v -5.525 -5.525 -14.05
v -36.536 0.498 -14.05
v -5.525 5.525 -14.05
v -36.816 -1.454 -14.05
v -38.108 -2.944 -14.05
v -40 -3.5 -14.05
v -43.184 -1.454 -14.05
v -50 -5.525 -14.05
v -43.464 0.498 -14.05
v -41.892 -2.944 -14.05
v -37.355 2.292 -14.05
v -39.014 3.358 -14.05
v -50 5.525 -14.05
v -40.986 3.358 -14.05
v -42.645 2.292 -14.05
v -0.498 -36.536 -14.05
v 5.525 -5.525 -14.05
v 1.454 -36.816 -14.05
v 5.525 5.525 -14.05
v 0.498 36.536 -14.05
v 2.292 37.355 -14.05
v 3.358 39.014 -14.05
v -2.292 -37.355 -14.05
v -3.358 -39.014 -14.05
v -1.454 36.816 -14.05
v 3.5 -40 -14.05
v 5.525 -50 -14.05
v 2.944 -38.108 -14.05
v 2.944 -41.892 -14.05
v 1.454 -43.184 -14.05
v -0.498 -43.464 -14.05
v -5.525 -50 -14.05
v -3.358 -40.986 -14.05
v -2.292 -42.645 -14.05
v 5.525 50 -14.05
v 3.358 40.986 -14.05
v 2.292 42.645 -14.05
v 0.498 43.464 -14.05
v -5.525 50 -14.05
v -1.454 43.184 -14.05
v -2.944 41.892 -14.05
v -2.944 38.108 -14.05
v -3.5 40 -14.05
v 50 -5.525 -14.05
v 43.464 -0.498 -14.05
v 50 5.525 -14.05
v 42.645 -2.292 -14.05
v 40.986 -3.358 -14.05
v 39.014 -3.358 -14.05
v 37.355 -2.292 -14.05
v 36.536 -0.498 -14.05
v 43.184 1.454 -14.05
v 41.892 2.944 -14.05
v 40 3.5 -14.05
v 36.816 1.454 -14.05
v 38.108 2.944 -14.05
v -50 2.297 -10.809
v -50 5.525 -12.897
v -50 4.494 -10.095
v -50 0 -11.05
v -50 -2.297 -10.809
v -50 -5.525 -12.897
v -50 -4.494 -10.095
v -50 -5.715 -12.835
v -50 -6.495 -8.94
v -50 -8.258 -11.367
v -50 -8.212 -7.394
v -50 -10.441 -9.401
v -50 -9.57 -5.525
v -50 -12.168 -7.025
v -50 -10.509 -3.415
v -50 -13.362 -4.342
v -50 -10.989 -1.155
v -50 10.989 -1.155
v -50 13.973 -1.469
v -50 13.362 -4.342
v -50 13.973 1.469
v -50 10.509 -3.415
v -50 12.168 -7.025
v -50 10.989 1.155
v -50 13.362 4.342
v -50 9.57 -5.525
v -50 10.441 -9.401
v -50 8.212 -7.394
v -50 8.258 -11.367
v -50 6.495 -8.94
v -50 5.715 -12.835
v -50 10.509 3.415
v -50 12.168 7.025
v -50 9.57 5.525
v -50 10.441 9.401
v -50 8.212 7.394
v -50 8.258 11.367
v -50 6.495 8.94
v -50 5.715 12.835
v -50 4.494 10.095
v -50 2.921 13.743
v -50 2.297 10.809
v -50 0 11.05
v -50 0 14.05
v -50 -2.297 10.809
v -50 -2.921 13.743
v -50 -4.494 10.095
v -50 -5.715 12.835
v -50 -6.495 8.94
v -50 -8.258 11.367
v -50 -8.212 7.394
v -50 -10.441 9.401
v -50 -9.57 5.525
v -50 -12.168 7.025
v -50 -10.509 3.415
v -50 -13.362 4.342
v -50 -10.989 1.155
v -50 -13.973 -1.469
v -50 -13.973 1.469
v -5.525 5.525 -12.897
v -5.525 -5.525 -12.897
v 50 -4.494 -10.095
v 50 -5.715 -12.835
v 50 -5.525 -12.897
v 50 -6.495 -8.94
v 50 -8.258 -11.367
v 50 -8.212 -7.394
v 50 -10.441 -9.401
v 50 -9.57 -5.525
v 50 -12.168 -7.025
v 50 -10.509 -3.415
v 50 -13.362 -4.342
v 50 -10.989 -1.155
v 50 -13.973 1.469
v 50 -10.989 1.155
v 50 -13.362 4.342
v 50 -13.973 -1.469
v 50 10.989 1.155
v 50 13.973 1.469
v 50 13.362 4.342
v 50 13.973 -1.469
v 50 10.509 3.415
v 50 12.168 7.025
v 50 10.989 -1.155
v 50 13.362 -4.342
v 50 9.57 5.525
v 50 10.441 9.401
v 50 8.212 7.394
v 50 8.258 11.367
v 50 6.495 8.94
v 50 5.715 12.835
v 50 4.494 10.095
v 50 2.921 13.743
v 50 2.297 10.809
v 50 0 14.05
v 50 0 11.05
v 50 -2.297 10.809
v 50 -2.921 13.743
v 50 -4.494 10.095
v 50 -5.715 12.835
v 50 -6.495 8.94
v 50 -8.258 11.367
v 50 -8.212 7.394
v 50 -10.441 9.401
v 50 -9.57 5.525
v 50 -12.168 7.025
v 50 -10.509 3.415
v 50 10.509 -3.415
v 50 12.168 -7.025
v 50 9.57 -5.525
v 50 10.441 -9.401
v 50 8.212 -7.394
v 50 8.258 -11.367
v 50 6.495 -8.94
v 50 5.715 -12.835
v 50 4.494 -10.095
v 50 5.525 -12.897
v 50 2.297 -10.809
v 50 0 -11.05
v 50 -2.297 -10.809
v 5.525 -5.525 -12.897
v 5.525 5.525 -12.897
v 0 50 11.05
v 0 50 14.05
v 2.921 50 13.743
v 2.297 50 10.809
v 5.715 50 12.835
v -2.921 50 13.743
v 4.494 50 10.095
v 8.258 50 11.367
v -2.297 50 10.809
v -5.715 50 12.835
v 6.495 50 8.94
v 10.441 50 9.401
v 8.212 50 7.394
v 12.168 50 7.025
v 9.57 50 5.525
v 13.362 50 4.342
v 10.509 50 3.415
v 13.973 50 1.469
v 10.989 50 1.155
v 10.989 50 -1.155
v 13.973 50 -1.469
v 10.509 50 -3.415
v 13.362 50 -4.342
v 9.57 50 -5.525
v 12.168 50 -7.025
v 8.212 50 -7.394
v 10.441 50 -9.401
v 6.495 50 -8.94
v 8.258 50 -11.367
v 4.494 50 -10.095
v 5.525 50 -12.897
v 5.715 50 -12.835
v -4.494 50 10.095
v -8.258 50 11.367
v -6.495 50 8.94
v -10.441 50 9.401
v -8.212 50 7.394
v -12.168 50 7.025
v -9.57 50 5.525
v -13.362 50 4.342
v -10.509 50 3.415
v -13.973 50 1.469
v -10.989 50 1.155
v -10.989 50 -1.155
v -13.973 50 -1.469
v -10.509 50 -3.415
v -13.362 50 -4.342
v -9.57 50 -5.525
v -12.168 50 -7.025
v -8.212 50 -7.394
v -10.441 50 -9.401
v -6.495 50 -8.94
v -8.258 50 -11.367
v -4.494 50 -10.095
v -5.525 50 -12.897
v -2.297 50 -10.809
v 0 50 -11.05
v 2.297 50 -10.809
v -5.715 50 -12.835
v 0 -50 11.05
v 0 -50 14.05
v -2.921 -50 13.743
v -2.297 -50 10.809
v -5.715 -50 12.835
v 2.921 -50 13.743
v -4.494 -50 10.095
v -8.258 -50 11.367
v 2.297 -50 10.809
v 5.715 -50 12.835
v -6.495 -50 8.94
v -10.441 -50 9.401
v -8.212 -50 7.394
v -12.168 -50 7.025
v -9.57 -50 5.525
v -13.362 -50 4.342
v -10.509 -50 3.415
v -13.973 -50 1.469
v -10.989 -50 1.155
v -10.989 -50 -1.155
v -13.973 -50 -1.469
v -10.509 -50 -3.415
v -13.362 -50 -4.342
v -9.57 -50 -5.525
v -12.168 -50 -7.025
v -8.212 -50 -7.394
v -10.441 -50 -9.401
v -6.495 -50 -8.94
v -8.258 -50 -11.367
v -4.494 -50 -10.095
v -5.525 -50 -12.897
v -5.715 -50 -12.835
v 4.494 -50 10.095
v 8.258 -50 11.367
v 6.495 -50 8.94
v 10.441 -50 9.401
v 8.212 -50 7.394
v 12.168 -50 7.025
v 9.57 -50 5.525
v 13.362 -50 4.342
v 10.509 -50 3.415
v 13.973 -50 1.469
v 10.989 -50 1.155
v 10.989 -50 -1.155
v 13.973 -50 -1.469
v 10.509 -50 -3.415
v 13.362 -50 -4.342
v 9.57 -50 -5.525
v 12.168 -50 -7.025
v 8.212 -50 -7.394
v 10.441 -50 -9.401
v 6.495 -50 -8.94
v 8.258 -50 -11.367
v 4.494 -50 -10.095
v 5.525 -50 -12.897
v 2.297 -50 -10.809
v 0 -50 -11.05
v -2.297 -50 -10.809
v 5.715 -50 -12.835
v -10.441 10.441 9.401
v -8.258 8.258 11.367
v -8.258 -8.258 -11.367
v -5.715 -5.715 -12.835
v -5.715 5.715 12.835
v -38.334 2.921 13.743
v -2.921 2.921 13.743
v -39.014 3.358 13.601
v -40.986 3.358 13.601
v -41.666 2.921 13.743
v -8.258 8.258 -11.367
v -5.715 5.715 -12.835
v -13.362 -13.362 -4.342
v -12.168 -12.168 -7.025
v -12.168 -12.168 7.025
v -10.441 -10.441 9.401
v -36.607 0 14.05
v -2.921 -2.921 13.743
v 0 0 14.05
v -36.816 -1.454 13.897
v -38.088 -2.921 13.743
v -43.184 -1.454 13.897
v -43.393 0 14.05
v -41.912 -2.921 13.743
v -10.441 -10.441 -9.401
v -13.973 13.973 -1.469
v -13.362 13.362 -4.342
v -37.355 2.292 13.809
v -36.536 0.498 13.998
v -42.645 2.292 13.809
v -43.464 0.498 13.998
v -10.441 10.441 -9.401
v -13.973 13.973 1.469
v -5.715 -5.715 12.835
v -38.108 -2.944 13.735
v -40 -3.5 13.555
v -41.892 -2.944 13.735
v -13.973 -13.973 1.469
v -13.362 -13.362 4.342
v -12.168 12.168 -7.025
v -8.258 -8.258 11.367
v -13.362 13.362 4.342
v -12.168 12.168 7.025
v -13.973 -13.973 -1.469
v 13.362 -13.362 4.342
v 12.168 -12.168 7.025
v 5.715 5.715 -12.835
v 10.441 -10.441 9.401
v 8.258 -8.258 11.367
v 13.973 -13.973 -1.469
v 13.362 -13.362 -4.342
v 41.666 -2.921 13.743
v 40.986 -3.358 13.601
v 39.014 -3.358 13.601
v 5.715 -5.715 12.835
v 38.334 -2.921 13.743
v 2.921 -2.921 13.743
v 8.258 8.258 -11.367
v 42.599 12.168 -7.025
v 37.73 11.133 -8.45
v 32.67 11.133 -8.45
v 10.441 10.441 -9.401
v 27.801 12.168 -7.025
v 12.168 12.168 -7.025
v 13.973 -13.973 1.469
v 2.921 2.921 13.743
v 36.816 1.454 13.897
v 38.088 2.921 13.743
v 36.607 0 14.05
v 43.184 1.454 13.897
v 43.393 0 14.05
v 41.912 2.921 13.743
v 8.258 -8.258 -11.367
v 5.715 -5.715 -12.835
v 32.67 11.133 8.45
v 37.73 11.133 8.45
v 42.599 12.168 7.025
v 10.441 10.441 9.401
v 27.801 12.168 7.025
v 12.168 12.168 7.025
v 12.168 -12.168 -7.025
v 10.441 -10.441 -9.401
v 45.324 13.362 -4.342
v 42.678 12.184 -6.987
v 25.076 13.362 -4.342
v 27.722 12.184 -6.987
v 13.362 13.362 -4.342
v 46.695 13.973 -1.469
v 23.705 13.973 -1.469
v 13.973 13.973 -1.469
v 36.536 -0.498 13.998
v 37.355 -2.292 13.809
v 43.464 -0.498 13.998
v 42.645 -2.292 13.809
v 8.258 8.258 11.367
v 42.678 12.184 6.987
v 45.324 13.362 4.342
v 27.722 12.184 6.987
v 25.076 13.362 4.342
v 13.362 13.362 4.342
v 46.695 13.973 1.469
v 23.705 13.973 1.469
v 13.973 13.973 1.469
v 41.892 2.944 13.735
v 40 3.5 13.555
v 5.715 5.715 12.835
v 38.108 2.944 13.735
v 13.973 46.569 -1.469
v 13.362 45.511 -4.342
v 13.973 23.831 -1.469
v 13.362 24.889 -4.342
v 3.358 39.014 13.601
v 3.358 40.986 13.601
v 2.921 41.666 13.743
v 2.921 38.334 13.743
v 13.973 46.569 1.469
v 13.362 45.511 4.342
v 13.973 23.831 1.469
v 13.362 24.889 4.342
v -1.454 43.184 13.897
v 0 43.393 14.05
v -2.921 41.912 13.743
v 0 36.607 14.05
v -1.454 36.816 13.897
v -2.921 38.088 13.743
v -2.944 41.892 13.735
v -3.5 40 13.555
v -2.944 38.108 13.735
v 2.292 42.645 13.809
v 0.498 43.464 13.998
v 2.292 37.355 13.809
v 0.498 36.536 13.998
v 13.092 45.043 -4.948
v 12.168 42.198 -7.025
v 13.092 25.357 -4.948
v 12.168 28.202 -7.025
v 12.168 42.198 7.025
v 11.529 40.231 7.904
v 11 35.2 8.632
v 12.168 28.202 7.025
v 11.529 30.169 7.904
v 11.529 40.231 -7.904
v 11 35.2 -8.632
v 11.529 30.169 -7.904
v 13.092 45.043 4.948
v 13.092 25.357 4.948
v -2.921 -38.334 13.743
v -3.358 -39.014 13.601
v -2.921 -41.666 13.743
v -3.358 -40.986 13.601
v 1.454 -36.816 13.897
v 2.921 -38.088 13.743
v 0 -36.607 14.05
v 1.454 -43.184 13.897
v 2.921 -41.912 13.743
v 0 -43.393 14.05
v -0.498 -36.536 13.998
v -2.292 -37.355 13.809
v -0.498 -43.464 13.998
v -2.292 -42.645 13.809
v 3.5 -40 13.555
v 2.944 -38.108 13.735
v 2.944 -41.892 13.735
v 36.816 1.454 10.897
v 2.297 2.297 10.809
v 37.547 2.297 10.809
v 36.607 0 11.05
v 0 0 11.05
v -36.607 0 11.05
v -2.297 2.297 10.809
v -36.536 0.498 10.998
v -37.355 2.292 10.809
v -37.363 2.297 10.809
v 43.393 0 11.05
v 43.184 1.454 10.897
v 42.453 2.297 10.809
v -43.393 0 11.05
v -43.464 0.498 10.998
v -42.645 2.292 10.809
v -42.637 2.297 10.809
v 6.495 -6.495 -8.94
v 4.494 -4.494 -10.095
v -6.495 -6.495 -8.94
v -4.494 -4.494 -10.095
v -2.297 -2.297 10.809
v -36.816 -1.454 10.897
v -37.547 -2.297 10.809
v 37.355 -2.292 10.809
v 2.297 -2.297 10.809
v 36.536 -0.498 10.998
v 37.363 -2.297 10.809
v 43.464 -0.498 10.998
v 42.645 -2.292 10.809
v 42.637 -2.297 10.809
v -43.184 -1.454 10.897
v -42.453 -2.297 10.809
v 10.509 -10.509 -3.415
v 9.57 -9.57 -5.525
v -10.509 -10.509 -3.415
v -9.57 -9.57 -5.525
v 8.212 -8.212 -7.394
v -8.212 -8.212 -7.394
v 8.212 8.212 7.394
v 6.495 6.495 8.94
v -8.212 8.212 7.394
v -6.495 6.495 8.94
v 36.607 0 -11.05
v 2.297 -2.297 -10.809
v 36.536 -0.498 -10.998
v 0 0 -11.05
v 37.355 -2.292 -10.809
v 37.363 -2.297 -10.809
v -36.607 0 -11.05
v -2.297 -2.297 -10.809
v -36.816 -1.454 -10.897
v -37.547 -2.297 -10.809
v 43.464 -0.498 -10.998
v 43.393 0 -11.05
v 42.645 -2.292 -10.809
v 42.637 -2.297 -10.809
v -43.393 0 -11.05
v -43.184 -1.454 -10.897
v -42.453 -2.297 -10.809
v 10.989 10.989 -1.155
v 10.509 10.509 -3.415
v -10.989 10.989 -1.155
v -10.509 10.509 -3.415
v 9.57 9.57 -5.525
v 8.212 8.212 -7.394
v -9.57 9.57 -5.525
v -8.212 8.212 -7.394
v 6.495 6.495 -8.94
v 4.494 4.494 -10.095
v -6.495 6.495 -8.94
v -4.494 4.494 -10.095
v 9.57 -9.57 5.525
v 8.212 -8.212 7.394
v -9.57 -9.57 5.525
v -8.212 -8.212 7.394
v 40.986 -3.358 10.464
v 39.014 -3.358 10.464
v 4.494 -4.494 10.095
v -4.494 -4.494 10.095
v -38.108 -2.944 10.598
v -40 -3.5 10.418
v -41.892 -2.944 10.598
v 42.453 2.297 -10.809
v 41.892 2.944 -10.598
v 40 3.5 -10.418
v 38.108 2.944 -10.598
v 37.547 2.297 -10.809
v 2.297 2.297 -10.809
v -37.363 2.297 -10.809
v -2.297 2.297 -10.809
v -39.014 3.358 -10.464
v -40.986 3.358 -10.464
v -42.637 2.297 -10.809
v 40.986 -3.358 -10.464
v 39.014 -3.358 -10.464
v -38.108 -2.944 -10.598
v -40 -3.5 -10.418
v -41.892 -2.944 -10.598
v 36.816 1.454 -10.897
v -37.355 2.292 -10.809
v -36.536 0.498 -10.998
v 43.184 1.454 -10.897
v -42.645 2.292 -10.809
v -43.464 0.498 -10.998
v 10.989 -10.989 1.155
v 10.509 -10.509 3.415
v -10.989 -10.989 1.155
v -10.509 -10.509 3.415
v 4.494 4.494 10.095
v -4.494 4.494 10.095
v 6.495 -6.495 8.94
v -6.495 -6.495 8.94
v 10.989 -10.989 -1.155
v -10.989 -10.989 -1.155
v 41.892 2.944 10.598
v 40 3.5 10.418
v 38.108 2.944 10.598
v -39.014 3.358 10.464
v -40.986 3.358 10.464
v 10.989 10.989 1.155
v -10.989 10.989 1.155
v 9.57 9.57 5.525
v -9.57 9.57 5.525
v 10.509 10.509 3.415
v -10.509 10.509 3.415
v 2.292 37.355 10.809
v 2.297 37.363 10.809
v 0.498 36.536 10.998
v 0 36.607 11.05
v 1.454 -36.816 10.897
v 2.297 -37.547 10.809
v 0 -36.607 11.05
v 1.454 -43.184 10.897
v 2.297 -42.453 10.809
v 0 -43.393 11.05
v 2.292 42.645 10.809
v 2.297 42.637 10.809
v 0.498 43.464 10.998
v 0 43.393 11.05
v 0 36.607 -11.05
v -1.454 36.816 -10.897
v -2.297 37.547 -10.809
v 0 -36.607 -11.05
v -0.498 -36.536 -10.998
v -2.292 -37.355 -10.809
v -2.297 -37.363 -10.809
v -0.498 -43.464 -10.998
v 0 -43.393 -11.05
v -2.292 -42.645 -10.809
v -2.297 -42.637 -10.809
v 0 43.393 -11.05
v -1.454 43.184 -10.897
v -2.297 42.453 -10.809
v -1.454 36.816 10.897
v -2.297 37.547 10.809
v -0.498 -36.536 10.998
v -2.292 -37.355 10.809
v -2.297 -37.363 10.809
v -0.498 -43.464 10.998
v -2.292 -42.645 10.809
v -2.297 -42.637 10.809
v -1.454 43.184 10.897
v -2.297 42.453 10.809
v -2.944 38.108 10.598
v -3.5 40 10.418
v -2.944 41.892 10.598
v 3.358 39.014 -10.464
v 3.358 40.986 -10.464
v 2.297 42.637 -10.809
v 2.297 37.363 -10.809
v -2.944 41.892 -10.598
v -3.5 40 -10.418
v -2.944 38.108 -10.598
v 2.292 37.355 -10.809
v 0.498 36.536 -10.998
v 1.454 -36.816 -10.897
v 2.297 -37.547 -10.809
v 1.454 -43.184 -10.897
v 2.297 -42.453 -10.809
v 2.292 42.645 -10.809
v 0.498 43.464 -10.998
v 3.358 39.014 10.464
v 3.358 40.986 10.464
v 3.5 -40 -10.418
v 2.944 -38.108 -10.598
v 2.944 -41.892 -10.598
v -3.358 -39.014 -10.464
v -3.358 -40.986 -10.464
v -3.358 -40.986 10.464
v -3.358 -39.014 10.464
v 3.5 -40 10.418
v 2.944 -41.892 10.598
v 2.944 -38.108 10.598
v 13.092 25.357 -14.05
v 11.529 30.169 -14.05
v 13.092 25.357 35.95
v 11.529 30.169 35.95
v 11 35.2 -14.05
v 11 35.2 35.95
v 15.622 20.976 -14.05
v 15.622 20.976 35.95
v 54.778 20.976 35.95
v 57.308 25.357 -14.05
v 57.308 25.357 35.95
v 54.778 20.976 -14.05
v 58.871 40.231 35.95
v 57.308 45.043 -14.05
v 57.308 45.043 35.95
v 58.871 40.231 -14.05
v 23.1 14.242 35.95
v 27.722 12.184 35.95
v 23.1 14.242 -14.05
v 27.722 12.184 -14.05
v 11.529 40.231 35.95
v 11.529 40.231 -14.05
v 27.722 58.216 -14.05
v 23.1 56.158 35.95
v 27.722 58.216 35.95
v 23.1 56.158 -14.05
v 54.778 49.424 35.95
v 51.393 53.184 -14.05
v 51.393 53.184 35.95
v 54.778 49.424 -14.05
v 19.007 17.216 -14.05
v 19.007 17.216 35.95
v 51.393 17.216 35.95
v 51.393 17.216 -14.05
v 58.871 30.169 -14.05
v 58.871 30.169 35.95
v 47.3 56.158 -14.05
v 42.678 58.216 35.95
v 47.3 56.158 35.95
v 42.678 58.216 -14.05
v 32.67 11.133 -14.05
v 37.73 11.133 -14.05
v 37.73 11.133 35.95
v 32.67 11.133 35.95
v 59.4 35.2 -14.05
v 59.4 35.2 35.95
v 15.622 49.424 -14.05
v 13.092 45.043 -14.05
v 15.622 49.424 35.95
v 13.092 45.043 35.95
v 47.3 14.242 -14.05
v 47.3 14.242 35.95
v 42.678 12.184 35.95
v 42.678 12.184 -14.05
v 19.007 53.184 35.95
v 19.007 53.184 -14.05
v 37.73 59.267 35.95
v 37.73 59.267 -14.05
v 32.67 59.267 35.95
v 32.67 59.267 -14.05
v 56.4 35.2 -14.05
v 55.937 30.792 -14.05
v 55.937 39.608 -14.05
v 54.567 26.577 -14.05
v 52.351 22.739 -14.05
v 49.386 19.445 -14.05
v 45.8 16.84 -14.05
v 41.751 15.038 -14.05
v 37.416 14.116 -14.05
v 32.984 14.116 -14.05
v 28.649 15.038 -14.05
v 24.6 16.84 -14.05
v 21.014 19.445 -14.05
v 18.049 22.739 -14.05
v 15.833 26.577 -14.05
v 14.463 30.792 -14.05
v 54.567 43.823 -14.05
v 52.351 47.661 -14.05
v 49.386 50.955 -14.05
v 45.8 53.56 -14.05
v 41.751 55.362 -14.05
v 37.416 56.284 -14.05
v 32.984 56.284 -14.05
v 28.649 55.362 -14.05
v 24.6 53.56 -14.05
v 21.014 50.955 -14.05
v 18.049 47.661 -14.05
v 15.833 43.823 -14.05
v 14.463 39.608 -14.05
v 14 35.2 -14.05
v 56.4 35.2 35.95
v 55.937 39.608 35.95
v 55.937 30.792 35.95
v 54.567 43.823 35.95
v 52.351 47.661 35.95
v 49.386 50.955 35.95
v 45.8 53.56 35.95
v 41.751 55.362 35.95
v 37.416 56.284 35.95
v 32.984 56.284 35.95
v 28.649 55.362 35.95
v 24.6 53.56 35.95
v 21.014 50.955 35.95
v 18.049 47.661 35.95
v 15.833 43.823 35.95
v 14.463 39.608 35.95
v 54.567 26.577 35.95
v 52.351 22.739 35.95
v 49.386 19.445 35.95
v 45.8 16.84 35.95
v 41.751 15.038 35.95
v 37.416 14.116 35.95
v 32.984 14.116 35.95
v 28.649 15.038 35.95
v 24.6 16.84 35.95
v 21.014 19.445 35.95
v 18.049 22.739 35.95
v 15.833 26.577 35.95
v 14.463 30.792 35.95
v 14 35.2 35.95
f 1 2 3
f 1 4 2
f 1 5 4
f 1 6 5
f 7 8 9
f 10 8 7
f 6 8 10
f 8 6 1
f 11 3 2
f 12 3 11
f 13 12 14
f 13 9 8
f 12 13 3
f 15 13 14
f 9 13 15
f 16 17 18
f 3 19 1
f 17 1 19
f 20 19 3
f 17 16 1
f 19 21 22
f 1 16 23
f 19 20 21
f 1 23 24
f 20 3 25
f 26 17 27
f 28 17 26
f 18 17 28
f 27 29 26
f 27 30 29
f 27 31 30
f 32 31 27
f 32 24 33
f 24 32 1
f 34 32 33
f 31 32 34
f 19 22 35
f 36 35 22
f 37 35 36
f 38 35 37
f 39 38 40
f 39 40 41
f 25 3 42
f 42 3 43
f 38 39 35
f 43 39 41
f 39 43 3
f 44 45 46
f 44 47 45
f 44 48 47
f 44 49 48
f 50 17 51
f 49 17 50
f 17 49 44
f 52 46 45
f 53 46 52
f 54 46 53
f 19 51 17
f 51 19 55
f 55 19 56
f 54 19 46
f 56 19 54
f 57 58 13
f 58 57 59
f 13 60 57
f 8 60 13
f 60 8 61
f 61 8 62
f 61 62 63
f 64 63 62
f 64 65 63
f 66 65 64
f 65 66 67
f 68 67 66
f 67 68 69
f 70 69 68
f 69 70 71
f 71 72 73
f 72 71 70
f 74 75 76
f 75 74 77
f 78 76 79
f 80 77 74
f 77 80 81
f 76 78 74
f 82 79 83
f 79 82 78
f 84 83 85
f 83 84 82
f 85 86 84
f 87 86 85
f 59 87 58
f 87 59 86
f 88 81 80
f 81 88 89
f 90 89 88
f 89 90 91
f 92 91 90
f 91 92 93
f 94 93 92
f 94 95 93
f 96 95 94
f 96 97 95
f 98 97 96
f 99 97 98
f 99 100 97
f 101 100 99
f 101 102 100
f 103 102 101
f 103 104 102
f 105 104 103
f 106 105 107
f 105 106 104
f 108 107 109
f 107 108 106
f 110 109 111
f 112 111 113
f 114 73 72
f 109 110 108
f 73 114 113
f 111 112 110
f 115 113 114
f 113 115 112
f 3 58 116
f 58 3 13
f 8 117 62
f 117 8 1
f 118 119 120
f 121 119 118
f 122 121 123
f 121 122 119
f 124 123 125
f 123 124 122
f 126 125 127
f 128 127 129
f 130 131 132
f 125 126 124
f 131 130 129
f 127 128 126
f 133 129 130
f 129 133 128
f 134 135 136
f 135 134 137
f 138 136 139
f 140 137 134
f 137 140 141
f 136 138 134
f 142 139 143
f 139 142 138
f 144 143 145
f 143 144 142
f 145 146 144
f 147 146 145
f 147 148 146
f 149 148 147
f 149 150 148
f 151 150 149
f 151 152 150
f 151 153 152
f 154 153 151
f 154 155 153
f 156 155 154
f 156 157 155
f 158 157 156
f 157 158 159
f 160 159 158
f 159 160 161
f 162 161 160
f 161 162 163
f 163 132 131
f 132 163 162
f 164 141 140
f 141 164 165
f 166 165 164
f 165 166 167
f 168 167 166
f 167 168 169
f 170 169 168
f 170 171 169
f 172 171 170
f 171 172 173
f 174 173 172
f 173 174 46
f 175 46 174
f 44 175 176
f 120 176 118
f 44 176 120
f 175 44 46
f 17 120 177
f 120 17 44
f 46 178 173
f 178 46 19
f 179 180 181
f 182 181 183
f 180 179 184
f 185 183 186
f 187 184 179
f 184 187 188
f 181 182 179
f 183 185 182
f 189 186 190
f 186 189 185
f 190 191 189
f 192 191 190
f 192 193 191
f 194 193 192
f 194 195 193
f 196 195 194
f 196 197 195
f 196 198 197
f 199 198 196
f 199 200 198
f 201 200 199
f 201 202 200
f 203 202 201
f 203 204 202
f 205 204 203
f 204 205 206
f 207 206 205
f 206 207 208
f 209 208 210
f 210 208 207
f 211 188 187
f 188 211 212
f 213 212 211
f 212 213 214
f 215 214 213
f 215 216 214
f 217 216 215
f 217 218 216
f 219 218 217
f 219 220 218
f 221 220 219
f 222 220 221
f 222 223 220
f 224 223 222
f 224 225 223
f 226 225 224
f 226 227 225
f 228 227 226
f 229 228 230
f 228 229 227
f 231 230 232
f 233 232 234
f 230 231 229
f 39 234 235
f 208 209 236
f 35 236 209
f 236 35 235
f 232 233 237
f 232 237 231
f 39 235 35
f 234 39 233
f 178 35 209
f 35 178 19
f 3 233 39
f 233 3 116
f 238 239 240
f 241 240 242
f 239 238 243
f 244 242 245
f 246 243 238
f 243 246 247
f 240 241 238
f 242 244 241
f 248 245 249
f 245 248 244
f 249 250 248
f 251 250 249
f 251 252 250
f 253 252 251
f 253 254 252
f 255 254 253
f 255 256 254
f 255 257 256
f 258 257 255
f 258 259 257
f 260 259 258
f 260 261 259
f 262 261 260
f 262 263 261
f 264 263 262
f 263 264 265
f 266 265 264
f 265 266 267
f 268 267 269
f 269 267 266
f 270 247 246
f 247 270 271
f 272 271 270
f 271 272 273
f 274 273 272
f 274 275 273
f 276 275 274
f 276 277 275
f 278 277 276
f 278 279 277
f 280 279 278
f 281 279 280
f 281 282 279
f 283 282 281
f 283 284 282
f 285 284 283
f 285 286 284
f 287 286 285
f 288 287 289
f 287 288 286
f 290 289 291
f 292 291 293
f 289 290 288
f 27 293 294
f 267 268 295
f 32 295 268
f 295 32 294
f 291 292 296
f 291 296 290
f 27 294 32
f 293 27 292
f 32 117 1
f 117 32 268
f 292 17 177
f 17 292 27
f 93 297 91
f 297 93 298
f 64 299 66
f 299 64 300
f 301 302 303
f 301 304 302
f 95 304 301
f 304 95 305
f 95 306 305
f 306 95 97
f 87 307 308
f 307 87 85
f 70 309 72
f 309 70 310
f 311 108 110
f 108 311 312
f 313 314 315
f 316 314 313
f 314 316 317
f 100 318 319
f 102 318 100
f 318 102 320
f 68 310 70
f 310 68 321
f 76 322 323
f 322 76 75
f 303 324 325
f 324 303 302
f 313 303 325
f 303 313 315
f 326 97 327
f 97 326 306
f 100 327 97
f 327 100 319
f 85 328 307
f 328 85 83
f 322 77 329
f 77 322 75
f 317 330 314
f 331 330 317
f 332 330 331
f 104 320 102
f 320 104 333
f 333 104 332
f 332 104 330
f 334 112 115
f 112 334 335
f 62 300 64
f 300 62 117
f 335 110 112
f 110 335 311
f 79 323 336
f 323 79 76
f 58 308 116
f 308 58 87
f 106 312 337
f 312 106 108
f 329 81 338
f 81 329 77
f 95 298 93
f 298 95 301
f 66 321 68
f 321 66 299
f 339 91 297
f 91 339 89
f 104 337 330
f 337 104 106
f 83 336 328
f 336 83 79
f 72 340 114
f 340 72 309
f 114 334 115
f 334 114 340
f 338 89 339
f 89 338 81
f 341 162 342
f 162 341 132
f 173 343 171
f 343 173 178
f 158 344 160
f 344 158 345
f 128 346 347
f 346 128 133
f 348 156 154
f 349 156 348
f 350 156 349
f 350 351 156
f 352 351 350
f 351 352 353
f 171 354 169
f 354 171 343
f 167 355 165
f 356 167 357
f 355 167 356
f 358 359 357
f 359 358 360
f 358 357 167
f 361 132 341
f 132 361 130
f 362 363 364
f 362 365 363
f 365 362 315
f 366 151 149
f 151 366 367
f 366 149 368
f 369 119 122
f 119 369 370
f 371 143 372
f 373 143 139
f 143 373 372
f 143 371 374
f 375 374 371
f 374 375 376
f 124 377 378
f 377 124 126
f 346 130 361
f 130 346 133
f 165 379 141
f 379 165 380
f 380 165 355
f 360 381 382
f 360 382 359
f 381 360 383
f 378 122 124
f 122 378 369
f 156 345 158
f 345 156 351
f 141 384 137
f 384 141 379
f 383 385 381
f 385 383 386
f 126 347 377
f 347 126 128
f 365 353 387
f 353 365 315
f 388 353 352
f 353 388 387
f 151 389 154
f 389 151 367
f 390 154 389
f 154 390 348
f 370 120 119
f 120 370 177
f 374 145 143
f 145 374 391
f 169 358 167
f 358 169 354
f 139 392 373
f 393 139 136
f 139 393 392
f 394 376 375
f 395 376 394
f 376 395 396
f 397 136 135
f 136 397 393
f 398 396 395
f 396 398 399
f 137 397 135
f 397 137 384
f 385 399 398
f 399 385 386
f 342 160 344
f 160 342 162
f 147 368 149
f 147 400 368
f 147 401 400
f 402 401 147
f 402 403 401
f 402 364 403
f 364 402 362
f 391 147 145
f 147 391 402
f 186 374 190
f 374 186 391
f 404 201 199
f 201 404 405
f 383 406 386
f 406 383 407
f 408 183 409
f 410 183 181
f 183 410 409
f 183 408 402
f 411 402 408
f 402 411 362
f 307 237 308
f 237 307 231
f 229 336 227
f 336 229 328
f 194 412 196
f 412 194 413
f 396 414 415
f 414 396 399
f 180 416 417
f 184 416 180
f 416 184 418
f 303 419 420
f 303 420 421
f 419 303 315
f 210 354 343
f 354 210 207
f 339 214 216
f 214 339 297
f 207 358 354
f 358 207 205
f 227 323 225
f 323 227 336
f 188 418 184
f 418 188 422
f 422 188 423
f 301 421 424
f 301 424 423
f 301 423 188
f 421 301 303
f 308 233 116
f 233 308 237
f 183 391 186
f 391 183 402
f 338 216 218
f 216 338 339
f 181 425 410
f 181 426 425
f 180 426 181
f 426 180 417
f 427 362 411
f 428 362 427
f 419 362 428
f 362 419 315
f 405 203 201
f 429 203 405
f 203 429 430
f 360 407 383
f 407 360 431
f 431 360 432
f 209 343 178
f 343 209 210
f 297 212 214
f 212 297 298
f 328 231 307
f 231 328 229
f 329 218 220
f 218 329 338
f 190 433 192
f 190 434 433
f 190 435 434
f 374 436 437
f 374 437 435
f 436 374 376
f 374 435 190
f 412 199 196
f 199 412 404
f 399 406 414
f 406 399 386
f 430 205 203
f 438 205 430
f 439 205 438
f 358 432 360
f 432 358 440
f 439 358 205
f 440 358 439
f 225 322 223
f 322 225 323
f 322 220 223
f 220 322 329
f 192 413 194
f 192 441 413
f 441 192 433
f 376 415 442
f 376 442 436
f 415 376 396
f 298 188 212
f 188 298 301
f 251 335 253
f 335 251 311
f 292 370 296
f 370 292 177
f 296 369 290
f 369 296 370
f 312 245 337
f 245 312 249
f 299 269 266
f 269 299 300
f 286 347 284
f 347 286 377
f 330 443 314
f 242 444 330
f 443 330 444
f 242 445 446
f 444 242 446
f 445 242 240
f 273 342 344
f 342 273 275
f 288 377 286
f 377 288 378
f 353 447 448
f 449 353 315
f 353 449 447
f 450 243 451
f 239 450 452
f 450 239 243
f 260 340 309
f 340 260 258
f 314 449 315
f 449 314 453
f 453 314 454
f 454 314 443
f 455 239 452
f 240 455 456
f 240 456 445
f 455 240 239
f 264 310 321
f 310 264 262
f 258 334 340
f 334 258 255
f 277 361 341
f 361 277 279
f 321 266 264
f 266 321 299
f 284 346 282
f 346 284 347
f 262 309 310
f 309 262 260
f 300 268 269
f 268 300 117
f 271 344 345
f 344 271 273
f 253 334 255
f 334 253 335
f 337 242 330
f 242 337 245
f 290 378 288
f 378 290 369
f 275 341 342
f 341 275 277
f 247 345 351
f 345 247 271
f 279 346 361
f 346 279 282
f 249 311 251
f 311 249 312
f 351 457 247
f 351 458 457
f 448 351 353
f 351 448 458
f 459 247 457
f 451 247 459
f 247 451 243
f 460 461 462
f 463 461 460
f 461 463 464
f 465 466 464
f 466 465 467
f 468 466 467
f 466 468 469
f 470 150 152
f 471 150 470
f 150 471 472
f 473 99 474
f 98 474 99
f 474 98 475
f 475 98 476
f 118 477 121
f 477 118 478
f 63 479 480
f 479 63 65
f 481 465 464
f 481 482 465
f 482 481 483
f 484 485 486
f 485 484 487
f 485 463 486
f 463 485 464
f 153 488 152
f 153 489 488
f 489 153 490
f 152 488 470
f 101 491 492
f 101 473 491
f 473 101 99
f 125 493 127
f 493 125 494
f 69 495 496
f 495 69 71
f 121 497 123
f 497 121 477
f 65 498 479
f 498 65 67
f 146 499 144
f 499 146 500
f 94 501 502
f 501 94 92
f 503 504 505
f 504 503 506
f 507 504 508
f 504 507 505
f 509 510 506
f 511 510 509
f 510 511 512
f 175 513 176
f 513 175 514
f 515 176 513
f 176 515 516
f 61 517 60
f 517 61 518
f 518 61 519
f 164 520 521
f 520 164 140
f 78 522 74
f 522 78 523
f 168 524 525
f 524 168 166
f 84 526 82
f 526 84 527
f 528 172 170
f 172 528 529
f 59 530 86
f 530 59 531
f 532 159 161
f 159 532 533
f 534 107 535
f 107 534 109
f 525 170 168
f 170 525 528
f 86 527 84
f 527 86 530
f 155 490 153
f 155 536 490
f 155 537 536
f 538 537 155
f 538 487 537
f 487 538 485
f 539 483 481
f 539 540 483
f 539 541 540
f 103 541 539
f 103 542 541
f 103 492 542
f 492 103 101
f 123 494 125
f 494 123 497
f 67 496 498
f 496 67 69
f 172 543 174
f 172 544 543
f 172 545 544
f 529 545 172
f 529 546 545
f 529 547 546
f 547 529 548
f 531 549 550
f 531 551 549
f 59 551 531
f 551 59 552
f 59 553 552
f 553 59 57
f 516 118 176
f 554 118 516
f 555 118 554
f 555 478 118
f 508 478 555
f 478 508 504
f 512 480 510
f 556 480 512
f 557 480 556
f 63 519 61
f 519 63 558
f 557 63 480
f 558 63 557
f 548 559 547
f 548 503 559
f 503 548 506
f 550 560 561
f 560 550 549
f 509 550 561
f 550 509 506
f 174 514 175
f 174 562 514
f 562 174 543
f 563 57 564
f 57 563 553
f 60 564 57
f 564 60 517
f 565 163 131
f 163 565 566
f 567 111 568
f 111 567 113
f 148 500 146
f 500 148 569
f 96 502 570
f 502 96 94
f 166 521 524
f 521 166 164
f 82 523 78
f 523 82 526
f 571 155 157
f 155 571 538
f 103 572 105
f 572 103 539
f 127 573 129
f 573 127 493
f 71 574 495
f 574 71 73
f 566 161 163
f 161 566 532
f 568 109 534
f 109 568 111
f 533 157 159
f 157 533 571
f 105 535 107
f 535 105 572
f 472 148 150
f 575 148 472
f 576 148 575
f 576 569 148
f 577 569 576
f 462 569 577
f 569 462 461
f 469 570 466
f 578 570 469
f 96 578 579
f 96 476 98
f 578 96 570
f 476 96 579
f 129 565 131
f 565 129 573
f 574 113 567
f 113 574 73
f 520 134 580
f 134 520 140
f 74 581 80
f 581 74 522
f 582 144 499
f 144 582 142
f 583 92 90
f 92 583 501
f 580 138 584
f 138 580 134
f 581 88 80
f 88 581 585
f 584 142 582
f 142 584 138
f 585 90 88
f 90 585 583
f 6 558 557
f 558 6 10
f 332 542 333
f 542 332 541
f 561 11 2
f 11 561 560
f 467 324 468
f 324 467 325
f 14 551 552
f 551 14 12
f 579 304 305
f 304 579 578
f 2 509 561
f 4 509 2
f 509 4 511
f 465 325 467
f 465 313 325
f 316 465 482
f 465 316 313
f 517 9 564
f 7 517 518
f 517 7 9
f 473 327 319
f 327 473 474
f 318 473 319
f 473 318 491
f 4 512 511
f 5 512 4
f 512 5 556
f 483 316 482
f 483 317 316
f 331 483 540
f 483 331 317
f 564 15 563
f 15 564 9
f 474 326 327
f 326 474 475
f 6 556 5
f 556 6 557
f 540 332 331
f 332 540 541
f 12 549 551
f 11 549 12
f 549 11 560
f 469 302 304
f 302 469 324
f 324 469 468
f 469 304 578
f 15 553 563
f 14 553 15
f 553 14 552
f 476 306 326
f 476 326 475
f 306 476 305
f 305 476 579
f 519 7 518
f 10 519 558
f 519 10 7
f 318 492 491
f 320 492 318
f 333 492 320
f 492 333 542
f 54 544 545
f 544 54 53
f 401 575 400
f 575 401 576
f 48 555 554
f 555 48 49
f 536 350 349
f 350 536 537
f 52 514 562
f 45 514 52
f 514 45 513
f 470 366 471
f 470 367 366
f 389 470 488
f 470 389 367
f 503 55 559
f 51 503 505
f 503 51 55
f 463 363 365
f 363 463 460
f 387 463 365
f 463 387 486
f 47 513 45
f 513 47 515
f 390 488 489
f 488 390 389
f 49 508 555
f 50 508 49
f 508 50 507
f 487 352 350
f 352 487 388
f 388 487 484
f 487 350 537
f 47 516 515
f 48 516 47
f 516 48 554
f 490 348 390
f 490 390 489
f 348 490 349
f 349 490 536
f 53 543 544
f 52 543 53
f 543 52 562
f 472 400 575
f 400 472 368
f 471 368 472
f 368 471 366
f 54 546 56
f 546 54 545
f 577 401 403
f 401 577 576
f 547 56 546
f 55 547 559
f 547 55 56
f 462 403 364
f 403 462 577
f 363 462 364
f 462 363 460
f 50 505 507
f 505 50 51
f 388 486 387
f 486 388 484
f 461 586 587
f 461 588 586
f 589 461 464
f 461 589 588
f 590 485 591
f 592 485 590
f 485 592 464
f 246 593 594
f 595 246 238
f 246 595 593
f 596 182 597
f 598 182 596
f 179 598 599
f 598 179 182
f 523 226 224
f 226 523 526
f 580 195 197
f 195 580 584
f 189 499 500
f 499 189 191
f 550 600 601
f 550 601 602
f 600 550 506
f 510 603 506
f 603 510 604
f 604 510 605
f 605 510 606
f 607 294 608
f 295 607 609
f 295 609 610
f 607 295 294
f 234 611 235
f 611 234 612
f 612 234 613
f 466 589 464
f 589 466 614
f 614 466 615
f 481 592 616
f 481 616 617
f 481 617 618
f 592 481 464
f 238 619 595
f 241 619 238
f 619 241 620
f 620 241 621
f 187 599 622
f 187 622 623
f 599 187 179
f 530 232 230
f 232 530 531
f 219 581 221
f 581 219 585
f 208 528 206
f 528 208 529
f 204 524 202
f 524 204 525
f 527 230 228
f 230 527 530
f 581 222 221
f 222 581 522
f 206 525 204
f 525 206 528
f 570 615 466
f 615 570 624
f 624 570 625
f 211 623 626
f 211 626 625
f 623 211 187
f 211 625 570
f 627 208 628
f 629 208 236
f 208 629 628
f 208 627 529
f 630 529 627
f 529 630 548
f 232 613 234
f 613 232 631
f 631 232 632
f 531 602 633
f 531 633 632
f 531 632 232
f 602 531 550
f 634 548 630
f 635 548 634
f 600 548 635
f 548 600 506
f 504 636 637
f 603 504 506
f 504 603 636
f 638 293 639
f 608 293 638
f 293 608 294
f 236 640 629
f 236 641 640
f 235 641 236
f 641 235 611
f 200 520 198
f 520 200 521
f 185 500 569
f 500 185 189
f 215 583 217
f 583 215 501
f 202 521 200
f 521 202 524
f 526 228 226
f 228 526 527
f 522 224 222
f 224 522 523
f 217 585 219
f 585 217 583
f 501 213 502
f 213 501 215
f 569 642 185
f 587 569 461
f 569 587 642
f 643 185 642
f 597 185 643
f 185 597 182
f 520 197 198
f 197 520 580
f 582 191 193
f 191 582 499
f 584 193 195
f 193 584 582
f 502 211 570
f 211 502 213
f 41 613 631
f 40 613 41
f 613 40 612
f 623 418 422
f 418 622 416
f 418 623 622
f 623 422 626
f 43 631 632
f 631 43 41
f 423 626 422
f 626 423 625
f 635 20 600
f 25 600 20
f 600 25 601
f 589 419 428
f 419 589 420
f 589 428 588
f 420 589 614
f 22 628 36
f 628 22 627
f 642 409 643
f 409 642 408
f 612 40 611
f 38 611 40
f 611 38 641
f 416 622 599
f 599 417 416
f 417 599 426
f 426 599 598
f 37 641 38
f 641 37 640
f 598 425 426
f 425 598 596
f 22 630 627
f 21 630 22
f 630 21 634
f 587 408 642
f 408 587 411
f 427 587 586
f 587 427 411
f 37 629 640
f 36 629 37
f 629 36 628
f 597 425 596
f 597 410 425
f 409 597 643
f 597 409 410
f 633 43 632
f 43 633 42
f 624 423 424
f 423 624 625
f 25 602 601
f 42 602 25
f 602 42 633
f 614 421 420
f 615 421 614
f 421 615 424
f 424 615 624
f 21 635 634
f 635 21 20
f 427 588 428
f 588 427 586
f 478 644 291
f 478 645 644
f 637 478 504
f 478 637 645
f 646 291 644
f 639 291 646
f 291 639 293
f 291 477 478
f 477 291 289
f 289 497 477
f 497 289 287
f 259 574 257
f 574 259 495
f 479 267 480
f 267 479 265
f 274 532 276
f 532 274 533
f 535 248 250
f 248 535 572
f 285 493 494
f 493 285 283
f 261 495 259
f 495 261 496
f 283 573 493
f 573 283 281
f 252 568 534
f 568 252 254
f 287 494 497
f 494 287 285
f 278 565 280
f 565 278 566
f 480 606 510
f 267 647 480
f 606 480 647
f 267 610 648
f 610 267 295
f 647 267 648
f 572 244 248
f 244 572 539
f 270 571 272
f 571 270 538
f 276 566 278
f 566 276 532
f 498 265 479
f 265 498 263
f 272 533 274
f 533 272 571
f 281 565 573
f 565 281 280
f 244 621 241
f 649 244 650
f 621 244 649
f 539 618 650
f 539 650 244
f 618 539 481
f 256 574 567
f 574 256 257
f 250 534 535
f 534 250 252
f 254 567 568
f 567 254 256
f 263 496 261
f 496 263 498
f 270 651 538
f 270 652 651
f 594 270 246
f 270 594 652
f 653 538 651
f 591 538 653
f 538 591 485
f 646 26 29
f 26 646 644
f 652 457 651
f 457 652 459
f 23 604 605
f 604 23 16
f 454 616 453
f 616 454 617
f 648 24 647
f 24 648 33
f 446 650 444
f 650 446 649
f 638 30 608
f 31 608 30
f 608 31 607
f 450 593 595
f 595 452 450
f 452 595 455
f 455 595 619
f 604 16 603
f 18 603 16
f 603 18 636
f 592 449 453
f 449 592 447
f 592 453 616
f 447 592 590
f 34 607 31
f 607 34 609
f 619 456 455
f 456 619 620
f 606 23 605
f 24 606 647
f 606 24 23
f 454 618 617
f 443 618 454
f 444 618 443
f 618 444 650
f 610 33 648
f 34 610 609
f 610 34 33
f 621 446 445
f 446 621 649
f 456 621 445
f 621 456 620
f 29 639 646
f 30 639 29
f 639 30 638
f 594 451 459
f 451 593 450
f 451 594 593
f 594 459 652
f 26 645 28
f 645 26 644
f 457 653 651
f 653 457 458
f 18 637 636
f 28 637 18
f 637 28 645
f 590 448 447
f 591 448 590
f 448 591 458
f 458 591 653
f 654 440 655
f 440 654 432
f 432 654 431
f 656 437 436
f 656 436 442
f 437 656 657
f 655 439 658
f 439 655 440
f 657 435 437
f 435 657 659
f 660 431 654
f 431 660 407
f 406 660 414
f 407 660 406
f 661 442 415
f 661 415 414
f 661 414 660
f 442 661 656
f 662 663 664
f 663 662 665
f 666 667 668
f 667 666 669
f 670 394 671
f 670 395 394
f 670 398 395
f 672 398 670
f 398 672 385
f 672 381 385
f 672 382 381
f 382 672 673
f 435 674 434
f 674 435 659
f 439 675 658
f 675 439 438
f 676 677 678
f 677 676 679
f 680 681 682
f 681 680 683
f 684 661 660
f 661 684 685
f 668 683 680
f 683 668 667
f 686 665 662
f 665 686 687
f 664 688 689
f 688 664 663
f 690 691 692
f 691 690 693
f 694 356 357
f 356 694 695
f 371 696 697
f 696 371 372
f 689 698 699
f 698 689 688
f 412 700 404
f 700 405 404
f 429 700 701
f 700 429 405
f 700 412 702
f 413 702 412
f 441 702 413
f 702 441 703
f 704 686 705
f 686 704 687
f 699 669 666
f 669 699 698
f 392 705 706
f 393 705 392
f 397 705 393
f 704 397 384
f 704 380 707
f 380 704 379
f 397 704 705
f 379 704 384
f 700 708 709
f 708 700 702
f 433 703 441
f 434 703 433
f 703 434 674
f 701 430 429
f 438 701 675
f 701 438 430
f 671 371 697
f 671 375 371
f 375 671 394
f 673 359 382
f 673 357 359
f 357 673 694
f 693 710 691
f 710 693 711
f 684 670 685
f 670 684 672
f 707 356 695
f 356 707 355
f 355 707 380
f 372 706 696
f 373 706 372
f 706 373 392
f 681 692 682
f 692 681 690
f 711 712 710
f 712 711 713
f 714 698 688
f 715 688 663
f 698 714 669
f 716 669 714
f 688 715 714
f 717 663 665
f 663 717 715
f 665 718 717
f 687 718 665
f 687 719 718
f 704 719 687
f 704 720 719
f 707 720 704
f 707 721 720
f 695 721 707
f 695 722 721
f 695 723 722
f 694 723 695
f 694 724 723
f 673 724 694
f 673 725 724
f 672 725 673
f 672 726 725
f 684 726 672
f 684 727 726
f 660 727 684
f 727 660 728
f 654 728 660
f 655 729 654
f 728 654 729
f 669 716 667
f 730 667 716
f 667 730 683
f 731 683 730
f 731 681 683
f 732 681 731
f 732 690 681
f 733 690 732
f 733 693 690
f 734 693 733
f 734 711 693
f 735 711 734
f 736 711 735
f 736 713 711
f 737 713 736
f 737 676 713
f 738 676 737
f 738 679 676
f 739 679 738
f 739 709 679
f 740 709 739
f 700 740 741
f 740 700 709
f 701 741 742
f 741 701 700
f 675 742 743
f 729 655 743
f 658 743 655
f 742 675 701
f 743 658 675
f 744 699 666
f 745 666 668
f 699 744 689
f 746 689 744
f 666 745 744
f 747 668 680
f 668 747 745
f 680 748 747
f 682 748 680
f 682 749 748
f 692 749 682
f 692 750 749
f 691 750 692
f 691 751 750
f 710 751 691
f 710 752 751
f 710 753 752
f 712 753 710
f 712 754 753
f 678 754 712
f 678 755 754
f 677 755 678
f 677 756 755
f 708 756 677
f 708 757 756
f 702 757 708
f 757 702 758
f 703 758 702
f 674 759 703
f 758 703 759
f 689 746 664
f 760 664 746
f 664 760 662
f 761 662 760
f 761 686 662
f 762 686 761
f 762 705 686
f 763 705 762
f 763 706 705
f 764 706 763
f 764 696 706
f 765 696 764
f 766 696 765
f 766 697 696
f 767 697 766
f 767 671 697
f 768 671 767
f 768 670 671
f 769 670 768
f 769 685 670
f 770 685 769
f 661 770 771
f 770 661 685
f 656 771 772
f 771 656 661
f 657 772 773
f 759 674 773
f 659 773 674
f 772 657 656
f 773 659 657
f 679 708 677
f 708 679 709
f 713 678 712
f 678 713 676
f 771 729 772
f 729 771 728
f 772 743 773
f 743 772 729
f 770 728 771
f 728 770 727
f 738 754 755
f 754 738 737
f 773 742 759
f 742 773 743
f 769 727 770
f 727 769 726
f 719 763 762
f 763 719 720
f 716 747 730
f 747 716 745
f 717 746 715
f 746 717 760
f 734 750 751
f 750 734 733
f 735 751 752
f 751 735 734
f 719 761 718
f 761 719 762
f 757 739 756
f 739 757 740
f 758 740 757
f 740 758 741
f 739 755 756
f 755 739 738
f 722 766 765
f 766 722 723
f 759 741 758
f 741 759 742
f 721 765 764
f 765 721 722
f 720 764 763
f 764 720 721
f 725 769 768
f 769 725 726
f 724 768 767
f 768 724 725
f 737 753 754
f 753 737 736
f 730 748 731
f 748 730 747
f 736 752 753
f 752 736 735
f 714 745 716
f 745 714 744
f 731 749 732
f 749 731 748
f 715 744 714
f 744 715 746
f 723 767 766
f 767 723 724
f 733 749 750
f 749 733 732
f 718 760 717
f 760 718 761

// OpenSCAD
// file: jointModule.scad
// Modules
// legs is a vector of legs,
// each leg is a vector containing:
// vector of the joint rotation
// horizontalPipeInsideDiameter
// Optional Boolean requesting addition of a flat bottom
// Optional Boolean or number requesting a hole drilled near the end,
//      If it is a number, this is the angle at which it should be drilled.
//      For historical reasons, 0 and true are equivalent
//      Use false when you need to skip this but still add another vector entry
// i.e. [[x, y, z], horizontalPipeInsideDiameter]

/*
i.e.
jointLegs = [
        [[0, 90, 0], horizontalPipeInsideDiameter, true, true],
        [[90, 90, 0], horizontalPipeInsideDiameter, true, 45],
        [[90, 90, 180], horizontalPipeInsideDiameter, true, 90],
    ];

 */
module joint(legs, sphereJointInsideDiameter, closeUpWithSphere)
{
    difference()
        {
            // Build
            union() color(JointColor)
                {
                    for (leg = legs) {
                        thisJointLegLength = len(leg) > 4 && leg[4] != false ? leg[4] : jointLegLength;
                        rotate(leg[0]) cylinder(
                        h = thisJointLegLength,
                        r = (leg[1] + jointWallThickness * 2) / 2);
                        // Add flat bottom
                        if (leg[2]) {
                            rotate(leg[0])
                                translate([
                                        (leg[1] / 2) + (jointWallThickness / 2),
                                    0,
                                        thisJointLegLength / 2
                                    ])
                                    cube([
                                        jointWallThickness,
                                        // The 0.4 is a guess at width. A parameter would probably be better.
                                            leg[1] * 0.5,
                                        thisJointLegLength
                                        ],
                                    center = true);
                            // Add a cylinder at the end of the leg to close any gap between leg flats
                            // This also creates a solid floor in case the sphere is so big
                            // that the cut below cuts off the bottom of it.
                            rotate(leg[0])
                                rotate([0, 90, 0])
                                    translate([
                                        0,
                                        0,
                                            leg[1] / 2,
                                        ])
                                        cylinder(h = jointWallThickness, r = (leg[1] * 0.5) / 2);
                        }
                    }

                    if (closeUpWithSphere)
                    // Use a Sphere to close up the gap between the pipes.
                    // This is kinda hacky, but it looks good to me and does the job.
                        sphere(d = sphereJointInsideDiameter + jointWallThickness * 2);

                }

            // Hollow out
            union()
                {
                    for (leg = legs) {
                        thisJointLegLength = len(leg) > 4 && leg[4] != false ? leg[4] : jointLegLength;
                        // The -0.01 ensures that the end of the tube is clear.
                        rotate(leg[0]) translate([0, 0, - 0.01]) cylinder(
                        h = thisJointLegLength + 0.02, r = leg[1] / 2);

                        // IF a flat bottom was added, also add a "cut" to ensure nothing
                        // else in the part extends below this flat bottom.
                        if (leg[2]) {
                            rotate(leg[0])
                                translate([
                                        (leg[1] / 2) + (jointWallThickness * 2),
                                    0,
                                        thisJointLegLength / 2
                                    ])
                                    cube([
                                        // The 0.00001 just ensures it doesn't clip the flat on the legs at all.
                                                jointWallThickness * 2 - 0.00001,
                                            leg[1] * 2,
                                            thisJointLegLength * 2
                                        ],
                                    center = true);
                        }
                        if (len(leg) > 3 && leg[3] != false) {
                            // Make a hole near the end of the leg for pinning
                            echo("Drilling Pinhole");
                            // The -0.01 ensures that the end of the tube is clear.
                            rotate([leg[0][0] + 90, leg[0][1], leg[0][2]]) translate([0,
                                    thisJointLegLength - jointPinHoleOffset, 0]) rotate([0, leg[3] == true ? 0 : leg[3], 0]) cylinder(
                            h = thisJointLegLength + 0.02, d = jointPinningHoleDiameter, center = true);
                        }
                    }

                    if (closeUpWithSphere) {
                        // Hollow out the sphere
                        sphere(d = sphereJointInsideDiameter);
                    }

                }
        }
}
// file: commonParameters.scad
// All measurements in millimeters

// 1.25" PVC Pipe:
horizontalPipeInsideDiameter_1_25pvc = 42.7; // NOT tested
verticalPipeInsideDiameter_1_25pvc = 42.4; // Tested.

// 0.5" PVC Pipe:
horizontalPipeInsideDiameter_0_50pvc = 22.1; // Tested.
verticalPipeInsideDiameter_0_50pvc = 21.7; // Tested.

// Parameters
jointLegLength = 50;
jointWallThickness = 3;
jointPinningHoleDiameter = 7;
jointPinHoleOffset = 10;

// Colors
JointColor = "CornflowerBlue";

// Resoution
// This is perfect for 3D Printing,
// but you may want to comment it out while working to improve preview
// performance
//$fa = 1;
//$fs = 0.4;
// Although this makes it VERY high rez, which might be better for the slicer? Experimenting with it instead.
// NOTE that using $fn causes FreeCAD and hence .step files exported to Fusion 360 to show round items as a series of faces instead of a single object.
//$fn = 500;
// main file
// Load in some defaults
include <commonParameters.scad>;

shaftPipeInsideDiameter = verticalPipeInsideDiameter_1_25pvc;

horizontalPipeInsideDiameter = horizontalPipeInsideDiameter_0_50pvc;
verticalPipeInsideDiameter = verticalPipeInsideDiameter_0_50pvc;

include <jointModule.scad>;

module shaftT()
{
    jointLegs = [
            [[0, 90, 0], horizontalPipeInsideDiameter, true, 90],
            [[180, 90, 0], horizontalPipeInsideDiameter, true, 90],
            [[90, 90, 0], horizontalPipeInsideDiameter, true, 90],
            [[270, 90, 0], horizontalPipeInsideDiameter, true, 90],
        ];

    rotate([0, 0, 180]) joint(jointLegs, verticalPipeInsideDiameter);
}

shaftT();

// Create offset shaft holder

shaftHolder = [
        [[0, 0, 0], shaftPipeInsideDiameter],
    ];

// The + 0.15 was selected via trial and error to ensure the shaft holder and leg pipes
// don't cross into each other at all.
shaftOffset = (verticalPipeInsideDiameter / 2) + (shaftPipeInsideDiameter / 2) + (jointWallThickness + 0.15);

// Double Wall Thickness to account for flat bottom
translate([shaftOffset, shaftOffset, - (
    horizontalPipeInsideDiameter + (jointWallThickness * 2)) / 2])
    rotate([0, 0, 180]) joint(shaftHolder, shaftPipeInsideDiameter);
